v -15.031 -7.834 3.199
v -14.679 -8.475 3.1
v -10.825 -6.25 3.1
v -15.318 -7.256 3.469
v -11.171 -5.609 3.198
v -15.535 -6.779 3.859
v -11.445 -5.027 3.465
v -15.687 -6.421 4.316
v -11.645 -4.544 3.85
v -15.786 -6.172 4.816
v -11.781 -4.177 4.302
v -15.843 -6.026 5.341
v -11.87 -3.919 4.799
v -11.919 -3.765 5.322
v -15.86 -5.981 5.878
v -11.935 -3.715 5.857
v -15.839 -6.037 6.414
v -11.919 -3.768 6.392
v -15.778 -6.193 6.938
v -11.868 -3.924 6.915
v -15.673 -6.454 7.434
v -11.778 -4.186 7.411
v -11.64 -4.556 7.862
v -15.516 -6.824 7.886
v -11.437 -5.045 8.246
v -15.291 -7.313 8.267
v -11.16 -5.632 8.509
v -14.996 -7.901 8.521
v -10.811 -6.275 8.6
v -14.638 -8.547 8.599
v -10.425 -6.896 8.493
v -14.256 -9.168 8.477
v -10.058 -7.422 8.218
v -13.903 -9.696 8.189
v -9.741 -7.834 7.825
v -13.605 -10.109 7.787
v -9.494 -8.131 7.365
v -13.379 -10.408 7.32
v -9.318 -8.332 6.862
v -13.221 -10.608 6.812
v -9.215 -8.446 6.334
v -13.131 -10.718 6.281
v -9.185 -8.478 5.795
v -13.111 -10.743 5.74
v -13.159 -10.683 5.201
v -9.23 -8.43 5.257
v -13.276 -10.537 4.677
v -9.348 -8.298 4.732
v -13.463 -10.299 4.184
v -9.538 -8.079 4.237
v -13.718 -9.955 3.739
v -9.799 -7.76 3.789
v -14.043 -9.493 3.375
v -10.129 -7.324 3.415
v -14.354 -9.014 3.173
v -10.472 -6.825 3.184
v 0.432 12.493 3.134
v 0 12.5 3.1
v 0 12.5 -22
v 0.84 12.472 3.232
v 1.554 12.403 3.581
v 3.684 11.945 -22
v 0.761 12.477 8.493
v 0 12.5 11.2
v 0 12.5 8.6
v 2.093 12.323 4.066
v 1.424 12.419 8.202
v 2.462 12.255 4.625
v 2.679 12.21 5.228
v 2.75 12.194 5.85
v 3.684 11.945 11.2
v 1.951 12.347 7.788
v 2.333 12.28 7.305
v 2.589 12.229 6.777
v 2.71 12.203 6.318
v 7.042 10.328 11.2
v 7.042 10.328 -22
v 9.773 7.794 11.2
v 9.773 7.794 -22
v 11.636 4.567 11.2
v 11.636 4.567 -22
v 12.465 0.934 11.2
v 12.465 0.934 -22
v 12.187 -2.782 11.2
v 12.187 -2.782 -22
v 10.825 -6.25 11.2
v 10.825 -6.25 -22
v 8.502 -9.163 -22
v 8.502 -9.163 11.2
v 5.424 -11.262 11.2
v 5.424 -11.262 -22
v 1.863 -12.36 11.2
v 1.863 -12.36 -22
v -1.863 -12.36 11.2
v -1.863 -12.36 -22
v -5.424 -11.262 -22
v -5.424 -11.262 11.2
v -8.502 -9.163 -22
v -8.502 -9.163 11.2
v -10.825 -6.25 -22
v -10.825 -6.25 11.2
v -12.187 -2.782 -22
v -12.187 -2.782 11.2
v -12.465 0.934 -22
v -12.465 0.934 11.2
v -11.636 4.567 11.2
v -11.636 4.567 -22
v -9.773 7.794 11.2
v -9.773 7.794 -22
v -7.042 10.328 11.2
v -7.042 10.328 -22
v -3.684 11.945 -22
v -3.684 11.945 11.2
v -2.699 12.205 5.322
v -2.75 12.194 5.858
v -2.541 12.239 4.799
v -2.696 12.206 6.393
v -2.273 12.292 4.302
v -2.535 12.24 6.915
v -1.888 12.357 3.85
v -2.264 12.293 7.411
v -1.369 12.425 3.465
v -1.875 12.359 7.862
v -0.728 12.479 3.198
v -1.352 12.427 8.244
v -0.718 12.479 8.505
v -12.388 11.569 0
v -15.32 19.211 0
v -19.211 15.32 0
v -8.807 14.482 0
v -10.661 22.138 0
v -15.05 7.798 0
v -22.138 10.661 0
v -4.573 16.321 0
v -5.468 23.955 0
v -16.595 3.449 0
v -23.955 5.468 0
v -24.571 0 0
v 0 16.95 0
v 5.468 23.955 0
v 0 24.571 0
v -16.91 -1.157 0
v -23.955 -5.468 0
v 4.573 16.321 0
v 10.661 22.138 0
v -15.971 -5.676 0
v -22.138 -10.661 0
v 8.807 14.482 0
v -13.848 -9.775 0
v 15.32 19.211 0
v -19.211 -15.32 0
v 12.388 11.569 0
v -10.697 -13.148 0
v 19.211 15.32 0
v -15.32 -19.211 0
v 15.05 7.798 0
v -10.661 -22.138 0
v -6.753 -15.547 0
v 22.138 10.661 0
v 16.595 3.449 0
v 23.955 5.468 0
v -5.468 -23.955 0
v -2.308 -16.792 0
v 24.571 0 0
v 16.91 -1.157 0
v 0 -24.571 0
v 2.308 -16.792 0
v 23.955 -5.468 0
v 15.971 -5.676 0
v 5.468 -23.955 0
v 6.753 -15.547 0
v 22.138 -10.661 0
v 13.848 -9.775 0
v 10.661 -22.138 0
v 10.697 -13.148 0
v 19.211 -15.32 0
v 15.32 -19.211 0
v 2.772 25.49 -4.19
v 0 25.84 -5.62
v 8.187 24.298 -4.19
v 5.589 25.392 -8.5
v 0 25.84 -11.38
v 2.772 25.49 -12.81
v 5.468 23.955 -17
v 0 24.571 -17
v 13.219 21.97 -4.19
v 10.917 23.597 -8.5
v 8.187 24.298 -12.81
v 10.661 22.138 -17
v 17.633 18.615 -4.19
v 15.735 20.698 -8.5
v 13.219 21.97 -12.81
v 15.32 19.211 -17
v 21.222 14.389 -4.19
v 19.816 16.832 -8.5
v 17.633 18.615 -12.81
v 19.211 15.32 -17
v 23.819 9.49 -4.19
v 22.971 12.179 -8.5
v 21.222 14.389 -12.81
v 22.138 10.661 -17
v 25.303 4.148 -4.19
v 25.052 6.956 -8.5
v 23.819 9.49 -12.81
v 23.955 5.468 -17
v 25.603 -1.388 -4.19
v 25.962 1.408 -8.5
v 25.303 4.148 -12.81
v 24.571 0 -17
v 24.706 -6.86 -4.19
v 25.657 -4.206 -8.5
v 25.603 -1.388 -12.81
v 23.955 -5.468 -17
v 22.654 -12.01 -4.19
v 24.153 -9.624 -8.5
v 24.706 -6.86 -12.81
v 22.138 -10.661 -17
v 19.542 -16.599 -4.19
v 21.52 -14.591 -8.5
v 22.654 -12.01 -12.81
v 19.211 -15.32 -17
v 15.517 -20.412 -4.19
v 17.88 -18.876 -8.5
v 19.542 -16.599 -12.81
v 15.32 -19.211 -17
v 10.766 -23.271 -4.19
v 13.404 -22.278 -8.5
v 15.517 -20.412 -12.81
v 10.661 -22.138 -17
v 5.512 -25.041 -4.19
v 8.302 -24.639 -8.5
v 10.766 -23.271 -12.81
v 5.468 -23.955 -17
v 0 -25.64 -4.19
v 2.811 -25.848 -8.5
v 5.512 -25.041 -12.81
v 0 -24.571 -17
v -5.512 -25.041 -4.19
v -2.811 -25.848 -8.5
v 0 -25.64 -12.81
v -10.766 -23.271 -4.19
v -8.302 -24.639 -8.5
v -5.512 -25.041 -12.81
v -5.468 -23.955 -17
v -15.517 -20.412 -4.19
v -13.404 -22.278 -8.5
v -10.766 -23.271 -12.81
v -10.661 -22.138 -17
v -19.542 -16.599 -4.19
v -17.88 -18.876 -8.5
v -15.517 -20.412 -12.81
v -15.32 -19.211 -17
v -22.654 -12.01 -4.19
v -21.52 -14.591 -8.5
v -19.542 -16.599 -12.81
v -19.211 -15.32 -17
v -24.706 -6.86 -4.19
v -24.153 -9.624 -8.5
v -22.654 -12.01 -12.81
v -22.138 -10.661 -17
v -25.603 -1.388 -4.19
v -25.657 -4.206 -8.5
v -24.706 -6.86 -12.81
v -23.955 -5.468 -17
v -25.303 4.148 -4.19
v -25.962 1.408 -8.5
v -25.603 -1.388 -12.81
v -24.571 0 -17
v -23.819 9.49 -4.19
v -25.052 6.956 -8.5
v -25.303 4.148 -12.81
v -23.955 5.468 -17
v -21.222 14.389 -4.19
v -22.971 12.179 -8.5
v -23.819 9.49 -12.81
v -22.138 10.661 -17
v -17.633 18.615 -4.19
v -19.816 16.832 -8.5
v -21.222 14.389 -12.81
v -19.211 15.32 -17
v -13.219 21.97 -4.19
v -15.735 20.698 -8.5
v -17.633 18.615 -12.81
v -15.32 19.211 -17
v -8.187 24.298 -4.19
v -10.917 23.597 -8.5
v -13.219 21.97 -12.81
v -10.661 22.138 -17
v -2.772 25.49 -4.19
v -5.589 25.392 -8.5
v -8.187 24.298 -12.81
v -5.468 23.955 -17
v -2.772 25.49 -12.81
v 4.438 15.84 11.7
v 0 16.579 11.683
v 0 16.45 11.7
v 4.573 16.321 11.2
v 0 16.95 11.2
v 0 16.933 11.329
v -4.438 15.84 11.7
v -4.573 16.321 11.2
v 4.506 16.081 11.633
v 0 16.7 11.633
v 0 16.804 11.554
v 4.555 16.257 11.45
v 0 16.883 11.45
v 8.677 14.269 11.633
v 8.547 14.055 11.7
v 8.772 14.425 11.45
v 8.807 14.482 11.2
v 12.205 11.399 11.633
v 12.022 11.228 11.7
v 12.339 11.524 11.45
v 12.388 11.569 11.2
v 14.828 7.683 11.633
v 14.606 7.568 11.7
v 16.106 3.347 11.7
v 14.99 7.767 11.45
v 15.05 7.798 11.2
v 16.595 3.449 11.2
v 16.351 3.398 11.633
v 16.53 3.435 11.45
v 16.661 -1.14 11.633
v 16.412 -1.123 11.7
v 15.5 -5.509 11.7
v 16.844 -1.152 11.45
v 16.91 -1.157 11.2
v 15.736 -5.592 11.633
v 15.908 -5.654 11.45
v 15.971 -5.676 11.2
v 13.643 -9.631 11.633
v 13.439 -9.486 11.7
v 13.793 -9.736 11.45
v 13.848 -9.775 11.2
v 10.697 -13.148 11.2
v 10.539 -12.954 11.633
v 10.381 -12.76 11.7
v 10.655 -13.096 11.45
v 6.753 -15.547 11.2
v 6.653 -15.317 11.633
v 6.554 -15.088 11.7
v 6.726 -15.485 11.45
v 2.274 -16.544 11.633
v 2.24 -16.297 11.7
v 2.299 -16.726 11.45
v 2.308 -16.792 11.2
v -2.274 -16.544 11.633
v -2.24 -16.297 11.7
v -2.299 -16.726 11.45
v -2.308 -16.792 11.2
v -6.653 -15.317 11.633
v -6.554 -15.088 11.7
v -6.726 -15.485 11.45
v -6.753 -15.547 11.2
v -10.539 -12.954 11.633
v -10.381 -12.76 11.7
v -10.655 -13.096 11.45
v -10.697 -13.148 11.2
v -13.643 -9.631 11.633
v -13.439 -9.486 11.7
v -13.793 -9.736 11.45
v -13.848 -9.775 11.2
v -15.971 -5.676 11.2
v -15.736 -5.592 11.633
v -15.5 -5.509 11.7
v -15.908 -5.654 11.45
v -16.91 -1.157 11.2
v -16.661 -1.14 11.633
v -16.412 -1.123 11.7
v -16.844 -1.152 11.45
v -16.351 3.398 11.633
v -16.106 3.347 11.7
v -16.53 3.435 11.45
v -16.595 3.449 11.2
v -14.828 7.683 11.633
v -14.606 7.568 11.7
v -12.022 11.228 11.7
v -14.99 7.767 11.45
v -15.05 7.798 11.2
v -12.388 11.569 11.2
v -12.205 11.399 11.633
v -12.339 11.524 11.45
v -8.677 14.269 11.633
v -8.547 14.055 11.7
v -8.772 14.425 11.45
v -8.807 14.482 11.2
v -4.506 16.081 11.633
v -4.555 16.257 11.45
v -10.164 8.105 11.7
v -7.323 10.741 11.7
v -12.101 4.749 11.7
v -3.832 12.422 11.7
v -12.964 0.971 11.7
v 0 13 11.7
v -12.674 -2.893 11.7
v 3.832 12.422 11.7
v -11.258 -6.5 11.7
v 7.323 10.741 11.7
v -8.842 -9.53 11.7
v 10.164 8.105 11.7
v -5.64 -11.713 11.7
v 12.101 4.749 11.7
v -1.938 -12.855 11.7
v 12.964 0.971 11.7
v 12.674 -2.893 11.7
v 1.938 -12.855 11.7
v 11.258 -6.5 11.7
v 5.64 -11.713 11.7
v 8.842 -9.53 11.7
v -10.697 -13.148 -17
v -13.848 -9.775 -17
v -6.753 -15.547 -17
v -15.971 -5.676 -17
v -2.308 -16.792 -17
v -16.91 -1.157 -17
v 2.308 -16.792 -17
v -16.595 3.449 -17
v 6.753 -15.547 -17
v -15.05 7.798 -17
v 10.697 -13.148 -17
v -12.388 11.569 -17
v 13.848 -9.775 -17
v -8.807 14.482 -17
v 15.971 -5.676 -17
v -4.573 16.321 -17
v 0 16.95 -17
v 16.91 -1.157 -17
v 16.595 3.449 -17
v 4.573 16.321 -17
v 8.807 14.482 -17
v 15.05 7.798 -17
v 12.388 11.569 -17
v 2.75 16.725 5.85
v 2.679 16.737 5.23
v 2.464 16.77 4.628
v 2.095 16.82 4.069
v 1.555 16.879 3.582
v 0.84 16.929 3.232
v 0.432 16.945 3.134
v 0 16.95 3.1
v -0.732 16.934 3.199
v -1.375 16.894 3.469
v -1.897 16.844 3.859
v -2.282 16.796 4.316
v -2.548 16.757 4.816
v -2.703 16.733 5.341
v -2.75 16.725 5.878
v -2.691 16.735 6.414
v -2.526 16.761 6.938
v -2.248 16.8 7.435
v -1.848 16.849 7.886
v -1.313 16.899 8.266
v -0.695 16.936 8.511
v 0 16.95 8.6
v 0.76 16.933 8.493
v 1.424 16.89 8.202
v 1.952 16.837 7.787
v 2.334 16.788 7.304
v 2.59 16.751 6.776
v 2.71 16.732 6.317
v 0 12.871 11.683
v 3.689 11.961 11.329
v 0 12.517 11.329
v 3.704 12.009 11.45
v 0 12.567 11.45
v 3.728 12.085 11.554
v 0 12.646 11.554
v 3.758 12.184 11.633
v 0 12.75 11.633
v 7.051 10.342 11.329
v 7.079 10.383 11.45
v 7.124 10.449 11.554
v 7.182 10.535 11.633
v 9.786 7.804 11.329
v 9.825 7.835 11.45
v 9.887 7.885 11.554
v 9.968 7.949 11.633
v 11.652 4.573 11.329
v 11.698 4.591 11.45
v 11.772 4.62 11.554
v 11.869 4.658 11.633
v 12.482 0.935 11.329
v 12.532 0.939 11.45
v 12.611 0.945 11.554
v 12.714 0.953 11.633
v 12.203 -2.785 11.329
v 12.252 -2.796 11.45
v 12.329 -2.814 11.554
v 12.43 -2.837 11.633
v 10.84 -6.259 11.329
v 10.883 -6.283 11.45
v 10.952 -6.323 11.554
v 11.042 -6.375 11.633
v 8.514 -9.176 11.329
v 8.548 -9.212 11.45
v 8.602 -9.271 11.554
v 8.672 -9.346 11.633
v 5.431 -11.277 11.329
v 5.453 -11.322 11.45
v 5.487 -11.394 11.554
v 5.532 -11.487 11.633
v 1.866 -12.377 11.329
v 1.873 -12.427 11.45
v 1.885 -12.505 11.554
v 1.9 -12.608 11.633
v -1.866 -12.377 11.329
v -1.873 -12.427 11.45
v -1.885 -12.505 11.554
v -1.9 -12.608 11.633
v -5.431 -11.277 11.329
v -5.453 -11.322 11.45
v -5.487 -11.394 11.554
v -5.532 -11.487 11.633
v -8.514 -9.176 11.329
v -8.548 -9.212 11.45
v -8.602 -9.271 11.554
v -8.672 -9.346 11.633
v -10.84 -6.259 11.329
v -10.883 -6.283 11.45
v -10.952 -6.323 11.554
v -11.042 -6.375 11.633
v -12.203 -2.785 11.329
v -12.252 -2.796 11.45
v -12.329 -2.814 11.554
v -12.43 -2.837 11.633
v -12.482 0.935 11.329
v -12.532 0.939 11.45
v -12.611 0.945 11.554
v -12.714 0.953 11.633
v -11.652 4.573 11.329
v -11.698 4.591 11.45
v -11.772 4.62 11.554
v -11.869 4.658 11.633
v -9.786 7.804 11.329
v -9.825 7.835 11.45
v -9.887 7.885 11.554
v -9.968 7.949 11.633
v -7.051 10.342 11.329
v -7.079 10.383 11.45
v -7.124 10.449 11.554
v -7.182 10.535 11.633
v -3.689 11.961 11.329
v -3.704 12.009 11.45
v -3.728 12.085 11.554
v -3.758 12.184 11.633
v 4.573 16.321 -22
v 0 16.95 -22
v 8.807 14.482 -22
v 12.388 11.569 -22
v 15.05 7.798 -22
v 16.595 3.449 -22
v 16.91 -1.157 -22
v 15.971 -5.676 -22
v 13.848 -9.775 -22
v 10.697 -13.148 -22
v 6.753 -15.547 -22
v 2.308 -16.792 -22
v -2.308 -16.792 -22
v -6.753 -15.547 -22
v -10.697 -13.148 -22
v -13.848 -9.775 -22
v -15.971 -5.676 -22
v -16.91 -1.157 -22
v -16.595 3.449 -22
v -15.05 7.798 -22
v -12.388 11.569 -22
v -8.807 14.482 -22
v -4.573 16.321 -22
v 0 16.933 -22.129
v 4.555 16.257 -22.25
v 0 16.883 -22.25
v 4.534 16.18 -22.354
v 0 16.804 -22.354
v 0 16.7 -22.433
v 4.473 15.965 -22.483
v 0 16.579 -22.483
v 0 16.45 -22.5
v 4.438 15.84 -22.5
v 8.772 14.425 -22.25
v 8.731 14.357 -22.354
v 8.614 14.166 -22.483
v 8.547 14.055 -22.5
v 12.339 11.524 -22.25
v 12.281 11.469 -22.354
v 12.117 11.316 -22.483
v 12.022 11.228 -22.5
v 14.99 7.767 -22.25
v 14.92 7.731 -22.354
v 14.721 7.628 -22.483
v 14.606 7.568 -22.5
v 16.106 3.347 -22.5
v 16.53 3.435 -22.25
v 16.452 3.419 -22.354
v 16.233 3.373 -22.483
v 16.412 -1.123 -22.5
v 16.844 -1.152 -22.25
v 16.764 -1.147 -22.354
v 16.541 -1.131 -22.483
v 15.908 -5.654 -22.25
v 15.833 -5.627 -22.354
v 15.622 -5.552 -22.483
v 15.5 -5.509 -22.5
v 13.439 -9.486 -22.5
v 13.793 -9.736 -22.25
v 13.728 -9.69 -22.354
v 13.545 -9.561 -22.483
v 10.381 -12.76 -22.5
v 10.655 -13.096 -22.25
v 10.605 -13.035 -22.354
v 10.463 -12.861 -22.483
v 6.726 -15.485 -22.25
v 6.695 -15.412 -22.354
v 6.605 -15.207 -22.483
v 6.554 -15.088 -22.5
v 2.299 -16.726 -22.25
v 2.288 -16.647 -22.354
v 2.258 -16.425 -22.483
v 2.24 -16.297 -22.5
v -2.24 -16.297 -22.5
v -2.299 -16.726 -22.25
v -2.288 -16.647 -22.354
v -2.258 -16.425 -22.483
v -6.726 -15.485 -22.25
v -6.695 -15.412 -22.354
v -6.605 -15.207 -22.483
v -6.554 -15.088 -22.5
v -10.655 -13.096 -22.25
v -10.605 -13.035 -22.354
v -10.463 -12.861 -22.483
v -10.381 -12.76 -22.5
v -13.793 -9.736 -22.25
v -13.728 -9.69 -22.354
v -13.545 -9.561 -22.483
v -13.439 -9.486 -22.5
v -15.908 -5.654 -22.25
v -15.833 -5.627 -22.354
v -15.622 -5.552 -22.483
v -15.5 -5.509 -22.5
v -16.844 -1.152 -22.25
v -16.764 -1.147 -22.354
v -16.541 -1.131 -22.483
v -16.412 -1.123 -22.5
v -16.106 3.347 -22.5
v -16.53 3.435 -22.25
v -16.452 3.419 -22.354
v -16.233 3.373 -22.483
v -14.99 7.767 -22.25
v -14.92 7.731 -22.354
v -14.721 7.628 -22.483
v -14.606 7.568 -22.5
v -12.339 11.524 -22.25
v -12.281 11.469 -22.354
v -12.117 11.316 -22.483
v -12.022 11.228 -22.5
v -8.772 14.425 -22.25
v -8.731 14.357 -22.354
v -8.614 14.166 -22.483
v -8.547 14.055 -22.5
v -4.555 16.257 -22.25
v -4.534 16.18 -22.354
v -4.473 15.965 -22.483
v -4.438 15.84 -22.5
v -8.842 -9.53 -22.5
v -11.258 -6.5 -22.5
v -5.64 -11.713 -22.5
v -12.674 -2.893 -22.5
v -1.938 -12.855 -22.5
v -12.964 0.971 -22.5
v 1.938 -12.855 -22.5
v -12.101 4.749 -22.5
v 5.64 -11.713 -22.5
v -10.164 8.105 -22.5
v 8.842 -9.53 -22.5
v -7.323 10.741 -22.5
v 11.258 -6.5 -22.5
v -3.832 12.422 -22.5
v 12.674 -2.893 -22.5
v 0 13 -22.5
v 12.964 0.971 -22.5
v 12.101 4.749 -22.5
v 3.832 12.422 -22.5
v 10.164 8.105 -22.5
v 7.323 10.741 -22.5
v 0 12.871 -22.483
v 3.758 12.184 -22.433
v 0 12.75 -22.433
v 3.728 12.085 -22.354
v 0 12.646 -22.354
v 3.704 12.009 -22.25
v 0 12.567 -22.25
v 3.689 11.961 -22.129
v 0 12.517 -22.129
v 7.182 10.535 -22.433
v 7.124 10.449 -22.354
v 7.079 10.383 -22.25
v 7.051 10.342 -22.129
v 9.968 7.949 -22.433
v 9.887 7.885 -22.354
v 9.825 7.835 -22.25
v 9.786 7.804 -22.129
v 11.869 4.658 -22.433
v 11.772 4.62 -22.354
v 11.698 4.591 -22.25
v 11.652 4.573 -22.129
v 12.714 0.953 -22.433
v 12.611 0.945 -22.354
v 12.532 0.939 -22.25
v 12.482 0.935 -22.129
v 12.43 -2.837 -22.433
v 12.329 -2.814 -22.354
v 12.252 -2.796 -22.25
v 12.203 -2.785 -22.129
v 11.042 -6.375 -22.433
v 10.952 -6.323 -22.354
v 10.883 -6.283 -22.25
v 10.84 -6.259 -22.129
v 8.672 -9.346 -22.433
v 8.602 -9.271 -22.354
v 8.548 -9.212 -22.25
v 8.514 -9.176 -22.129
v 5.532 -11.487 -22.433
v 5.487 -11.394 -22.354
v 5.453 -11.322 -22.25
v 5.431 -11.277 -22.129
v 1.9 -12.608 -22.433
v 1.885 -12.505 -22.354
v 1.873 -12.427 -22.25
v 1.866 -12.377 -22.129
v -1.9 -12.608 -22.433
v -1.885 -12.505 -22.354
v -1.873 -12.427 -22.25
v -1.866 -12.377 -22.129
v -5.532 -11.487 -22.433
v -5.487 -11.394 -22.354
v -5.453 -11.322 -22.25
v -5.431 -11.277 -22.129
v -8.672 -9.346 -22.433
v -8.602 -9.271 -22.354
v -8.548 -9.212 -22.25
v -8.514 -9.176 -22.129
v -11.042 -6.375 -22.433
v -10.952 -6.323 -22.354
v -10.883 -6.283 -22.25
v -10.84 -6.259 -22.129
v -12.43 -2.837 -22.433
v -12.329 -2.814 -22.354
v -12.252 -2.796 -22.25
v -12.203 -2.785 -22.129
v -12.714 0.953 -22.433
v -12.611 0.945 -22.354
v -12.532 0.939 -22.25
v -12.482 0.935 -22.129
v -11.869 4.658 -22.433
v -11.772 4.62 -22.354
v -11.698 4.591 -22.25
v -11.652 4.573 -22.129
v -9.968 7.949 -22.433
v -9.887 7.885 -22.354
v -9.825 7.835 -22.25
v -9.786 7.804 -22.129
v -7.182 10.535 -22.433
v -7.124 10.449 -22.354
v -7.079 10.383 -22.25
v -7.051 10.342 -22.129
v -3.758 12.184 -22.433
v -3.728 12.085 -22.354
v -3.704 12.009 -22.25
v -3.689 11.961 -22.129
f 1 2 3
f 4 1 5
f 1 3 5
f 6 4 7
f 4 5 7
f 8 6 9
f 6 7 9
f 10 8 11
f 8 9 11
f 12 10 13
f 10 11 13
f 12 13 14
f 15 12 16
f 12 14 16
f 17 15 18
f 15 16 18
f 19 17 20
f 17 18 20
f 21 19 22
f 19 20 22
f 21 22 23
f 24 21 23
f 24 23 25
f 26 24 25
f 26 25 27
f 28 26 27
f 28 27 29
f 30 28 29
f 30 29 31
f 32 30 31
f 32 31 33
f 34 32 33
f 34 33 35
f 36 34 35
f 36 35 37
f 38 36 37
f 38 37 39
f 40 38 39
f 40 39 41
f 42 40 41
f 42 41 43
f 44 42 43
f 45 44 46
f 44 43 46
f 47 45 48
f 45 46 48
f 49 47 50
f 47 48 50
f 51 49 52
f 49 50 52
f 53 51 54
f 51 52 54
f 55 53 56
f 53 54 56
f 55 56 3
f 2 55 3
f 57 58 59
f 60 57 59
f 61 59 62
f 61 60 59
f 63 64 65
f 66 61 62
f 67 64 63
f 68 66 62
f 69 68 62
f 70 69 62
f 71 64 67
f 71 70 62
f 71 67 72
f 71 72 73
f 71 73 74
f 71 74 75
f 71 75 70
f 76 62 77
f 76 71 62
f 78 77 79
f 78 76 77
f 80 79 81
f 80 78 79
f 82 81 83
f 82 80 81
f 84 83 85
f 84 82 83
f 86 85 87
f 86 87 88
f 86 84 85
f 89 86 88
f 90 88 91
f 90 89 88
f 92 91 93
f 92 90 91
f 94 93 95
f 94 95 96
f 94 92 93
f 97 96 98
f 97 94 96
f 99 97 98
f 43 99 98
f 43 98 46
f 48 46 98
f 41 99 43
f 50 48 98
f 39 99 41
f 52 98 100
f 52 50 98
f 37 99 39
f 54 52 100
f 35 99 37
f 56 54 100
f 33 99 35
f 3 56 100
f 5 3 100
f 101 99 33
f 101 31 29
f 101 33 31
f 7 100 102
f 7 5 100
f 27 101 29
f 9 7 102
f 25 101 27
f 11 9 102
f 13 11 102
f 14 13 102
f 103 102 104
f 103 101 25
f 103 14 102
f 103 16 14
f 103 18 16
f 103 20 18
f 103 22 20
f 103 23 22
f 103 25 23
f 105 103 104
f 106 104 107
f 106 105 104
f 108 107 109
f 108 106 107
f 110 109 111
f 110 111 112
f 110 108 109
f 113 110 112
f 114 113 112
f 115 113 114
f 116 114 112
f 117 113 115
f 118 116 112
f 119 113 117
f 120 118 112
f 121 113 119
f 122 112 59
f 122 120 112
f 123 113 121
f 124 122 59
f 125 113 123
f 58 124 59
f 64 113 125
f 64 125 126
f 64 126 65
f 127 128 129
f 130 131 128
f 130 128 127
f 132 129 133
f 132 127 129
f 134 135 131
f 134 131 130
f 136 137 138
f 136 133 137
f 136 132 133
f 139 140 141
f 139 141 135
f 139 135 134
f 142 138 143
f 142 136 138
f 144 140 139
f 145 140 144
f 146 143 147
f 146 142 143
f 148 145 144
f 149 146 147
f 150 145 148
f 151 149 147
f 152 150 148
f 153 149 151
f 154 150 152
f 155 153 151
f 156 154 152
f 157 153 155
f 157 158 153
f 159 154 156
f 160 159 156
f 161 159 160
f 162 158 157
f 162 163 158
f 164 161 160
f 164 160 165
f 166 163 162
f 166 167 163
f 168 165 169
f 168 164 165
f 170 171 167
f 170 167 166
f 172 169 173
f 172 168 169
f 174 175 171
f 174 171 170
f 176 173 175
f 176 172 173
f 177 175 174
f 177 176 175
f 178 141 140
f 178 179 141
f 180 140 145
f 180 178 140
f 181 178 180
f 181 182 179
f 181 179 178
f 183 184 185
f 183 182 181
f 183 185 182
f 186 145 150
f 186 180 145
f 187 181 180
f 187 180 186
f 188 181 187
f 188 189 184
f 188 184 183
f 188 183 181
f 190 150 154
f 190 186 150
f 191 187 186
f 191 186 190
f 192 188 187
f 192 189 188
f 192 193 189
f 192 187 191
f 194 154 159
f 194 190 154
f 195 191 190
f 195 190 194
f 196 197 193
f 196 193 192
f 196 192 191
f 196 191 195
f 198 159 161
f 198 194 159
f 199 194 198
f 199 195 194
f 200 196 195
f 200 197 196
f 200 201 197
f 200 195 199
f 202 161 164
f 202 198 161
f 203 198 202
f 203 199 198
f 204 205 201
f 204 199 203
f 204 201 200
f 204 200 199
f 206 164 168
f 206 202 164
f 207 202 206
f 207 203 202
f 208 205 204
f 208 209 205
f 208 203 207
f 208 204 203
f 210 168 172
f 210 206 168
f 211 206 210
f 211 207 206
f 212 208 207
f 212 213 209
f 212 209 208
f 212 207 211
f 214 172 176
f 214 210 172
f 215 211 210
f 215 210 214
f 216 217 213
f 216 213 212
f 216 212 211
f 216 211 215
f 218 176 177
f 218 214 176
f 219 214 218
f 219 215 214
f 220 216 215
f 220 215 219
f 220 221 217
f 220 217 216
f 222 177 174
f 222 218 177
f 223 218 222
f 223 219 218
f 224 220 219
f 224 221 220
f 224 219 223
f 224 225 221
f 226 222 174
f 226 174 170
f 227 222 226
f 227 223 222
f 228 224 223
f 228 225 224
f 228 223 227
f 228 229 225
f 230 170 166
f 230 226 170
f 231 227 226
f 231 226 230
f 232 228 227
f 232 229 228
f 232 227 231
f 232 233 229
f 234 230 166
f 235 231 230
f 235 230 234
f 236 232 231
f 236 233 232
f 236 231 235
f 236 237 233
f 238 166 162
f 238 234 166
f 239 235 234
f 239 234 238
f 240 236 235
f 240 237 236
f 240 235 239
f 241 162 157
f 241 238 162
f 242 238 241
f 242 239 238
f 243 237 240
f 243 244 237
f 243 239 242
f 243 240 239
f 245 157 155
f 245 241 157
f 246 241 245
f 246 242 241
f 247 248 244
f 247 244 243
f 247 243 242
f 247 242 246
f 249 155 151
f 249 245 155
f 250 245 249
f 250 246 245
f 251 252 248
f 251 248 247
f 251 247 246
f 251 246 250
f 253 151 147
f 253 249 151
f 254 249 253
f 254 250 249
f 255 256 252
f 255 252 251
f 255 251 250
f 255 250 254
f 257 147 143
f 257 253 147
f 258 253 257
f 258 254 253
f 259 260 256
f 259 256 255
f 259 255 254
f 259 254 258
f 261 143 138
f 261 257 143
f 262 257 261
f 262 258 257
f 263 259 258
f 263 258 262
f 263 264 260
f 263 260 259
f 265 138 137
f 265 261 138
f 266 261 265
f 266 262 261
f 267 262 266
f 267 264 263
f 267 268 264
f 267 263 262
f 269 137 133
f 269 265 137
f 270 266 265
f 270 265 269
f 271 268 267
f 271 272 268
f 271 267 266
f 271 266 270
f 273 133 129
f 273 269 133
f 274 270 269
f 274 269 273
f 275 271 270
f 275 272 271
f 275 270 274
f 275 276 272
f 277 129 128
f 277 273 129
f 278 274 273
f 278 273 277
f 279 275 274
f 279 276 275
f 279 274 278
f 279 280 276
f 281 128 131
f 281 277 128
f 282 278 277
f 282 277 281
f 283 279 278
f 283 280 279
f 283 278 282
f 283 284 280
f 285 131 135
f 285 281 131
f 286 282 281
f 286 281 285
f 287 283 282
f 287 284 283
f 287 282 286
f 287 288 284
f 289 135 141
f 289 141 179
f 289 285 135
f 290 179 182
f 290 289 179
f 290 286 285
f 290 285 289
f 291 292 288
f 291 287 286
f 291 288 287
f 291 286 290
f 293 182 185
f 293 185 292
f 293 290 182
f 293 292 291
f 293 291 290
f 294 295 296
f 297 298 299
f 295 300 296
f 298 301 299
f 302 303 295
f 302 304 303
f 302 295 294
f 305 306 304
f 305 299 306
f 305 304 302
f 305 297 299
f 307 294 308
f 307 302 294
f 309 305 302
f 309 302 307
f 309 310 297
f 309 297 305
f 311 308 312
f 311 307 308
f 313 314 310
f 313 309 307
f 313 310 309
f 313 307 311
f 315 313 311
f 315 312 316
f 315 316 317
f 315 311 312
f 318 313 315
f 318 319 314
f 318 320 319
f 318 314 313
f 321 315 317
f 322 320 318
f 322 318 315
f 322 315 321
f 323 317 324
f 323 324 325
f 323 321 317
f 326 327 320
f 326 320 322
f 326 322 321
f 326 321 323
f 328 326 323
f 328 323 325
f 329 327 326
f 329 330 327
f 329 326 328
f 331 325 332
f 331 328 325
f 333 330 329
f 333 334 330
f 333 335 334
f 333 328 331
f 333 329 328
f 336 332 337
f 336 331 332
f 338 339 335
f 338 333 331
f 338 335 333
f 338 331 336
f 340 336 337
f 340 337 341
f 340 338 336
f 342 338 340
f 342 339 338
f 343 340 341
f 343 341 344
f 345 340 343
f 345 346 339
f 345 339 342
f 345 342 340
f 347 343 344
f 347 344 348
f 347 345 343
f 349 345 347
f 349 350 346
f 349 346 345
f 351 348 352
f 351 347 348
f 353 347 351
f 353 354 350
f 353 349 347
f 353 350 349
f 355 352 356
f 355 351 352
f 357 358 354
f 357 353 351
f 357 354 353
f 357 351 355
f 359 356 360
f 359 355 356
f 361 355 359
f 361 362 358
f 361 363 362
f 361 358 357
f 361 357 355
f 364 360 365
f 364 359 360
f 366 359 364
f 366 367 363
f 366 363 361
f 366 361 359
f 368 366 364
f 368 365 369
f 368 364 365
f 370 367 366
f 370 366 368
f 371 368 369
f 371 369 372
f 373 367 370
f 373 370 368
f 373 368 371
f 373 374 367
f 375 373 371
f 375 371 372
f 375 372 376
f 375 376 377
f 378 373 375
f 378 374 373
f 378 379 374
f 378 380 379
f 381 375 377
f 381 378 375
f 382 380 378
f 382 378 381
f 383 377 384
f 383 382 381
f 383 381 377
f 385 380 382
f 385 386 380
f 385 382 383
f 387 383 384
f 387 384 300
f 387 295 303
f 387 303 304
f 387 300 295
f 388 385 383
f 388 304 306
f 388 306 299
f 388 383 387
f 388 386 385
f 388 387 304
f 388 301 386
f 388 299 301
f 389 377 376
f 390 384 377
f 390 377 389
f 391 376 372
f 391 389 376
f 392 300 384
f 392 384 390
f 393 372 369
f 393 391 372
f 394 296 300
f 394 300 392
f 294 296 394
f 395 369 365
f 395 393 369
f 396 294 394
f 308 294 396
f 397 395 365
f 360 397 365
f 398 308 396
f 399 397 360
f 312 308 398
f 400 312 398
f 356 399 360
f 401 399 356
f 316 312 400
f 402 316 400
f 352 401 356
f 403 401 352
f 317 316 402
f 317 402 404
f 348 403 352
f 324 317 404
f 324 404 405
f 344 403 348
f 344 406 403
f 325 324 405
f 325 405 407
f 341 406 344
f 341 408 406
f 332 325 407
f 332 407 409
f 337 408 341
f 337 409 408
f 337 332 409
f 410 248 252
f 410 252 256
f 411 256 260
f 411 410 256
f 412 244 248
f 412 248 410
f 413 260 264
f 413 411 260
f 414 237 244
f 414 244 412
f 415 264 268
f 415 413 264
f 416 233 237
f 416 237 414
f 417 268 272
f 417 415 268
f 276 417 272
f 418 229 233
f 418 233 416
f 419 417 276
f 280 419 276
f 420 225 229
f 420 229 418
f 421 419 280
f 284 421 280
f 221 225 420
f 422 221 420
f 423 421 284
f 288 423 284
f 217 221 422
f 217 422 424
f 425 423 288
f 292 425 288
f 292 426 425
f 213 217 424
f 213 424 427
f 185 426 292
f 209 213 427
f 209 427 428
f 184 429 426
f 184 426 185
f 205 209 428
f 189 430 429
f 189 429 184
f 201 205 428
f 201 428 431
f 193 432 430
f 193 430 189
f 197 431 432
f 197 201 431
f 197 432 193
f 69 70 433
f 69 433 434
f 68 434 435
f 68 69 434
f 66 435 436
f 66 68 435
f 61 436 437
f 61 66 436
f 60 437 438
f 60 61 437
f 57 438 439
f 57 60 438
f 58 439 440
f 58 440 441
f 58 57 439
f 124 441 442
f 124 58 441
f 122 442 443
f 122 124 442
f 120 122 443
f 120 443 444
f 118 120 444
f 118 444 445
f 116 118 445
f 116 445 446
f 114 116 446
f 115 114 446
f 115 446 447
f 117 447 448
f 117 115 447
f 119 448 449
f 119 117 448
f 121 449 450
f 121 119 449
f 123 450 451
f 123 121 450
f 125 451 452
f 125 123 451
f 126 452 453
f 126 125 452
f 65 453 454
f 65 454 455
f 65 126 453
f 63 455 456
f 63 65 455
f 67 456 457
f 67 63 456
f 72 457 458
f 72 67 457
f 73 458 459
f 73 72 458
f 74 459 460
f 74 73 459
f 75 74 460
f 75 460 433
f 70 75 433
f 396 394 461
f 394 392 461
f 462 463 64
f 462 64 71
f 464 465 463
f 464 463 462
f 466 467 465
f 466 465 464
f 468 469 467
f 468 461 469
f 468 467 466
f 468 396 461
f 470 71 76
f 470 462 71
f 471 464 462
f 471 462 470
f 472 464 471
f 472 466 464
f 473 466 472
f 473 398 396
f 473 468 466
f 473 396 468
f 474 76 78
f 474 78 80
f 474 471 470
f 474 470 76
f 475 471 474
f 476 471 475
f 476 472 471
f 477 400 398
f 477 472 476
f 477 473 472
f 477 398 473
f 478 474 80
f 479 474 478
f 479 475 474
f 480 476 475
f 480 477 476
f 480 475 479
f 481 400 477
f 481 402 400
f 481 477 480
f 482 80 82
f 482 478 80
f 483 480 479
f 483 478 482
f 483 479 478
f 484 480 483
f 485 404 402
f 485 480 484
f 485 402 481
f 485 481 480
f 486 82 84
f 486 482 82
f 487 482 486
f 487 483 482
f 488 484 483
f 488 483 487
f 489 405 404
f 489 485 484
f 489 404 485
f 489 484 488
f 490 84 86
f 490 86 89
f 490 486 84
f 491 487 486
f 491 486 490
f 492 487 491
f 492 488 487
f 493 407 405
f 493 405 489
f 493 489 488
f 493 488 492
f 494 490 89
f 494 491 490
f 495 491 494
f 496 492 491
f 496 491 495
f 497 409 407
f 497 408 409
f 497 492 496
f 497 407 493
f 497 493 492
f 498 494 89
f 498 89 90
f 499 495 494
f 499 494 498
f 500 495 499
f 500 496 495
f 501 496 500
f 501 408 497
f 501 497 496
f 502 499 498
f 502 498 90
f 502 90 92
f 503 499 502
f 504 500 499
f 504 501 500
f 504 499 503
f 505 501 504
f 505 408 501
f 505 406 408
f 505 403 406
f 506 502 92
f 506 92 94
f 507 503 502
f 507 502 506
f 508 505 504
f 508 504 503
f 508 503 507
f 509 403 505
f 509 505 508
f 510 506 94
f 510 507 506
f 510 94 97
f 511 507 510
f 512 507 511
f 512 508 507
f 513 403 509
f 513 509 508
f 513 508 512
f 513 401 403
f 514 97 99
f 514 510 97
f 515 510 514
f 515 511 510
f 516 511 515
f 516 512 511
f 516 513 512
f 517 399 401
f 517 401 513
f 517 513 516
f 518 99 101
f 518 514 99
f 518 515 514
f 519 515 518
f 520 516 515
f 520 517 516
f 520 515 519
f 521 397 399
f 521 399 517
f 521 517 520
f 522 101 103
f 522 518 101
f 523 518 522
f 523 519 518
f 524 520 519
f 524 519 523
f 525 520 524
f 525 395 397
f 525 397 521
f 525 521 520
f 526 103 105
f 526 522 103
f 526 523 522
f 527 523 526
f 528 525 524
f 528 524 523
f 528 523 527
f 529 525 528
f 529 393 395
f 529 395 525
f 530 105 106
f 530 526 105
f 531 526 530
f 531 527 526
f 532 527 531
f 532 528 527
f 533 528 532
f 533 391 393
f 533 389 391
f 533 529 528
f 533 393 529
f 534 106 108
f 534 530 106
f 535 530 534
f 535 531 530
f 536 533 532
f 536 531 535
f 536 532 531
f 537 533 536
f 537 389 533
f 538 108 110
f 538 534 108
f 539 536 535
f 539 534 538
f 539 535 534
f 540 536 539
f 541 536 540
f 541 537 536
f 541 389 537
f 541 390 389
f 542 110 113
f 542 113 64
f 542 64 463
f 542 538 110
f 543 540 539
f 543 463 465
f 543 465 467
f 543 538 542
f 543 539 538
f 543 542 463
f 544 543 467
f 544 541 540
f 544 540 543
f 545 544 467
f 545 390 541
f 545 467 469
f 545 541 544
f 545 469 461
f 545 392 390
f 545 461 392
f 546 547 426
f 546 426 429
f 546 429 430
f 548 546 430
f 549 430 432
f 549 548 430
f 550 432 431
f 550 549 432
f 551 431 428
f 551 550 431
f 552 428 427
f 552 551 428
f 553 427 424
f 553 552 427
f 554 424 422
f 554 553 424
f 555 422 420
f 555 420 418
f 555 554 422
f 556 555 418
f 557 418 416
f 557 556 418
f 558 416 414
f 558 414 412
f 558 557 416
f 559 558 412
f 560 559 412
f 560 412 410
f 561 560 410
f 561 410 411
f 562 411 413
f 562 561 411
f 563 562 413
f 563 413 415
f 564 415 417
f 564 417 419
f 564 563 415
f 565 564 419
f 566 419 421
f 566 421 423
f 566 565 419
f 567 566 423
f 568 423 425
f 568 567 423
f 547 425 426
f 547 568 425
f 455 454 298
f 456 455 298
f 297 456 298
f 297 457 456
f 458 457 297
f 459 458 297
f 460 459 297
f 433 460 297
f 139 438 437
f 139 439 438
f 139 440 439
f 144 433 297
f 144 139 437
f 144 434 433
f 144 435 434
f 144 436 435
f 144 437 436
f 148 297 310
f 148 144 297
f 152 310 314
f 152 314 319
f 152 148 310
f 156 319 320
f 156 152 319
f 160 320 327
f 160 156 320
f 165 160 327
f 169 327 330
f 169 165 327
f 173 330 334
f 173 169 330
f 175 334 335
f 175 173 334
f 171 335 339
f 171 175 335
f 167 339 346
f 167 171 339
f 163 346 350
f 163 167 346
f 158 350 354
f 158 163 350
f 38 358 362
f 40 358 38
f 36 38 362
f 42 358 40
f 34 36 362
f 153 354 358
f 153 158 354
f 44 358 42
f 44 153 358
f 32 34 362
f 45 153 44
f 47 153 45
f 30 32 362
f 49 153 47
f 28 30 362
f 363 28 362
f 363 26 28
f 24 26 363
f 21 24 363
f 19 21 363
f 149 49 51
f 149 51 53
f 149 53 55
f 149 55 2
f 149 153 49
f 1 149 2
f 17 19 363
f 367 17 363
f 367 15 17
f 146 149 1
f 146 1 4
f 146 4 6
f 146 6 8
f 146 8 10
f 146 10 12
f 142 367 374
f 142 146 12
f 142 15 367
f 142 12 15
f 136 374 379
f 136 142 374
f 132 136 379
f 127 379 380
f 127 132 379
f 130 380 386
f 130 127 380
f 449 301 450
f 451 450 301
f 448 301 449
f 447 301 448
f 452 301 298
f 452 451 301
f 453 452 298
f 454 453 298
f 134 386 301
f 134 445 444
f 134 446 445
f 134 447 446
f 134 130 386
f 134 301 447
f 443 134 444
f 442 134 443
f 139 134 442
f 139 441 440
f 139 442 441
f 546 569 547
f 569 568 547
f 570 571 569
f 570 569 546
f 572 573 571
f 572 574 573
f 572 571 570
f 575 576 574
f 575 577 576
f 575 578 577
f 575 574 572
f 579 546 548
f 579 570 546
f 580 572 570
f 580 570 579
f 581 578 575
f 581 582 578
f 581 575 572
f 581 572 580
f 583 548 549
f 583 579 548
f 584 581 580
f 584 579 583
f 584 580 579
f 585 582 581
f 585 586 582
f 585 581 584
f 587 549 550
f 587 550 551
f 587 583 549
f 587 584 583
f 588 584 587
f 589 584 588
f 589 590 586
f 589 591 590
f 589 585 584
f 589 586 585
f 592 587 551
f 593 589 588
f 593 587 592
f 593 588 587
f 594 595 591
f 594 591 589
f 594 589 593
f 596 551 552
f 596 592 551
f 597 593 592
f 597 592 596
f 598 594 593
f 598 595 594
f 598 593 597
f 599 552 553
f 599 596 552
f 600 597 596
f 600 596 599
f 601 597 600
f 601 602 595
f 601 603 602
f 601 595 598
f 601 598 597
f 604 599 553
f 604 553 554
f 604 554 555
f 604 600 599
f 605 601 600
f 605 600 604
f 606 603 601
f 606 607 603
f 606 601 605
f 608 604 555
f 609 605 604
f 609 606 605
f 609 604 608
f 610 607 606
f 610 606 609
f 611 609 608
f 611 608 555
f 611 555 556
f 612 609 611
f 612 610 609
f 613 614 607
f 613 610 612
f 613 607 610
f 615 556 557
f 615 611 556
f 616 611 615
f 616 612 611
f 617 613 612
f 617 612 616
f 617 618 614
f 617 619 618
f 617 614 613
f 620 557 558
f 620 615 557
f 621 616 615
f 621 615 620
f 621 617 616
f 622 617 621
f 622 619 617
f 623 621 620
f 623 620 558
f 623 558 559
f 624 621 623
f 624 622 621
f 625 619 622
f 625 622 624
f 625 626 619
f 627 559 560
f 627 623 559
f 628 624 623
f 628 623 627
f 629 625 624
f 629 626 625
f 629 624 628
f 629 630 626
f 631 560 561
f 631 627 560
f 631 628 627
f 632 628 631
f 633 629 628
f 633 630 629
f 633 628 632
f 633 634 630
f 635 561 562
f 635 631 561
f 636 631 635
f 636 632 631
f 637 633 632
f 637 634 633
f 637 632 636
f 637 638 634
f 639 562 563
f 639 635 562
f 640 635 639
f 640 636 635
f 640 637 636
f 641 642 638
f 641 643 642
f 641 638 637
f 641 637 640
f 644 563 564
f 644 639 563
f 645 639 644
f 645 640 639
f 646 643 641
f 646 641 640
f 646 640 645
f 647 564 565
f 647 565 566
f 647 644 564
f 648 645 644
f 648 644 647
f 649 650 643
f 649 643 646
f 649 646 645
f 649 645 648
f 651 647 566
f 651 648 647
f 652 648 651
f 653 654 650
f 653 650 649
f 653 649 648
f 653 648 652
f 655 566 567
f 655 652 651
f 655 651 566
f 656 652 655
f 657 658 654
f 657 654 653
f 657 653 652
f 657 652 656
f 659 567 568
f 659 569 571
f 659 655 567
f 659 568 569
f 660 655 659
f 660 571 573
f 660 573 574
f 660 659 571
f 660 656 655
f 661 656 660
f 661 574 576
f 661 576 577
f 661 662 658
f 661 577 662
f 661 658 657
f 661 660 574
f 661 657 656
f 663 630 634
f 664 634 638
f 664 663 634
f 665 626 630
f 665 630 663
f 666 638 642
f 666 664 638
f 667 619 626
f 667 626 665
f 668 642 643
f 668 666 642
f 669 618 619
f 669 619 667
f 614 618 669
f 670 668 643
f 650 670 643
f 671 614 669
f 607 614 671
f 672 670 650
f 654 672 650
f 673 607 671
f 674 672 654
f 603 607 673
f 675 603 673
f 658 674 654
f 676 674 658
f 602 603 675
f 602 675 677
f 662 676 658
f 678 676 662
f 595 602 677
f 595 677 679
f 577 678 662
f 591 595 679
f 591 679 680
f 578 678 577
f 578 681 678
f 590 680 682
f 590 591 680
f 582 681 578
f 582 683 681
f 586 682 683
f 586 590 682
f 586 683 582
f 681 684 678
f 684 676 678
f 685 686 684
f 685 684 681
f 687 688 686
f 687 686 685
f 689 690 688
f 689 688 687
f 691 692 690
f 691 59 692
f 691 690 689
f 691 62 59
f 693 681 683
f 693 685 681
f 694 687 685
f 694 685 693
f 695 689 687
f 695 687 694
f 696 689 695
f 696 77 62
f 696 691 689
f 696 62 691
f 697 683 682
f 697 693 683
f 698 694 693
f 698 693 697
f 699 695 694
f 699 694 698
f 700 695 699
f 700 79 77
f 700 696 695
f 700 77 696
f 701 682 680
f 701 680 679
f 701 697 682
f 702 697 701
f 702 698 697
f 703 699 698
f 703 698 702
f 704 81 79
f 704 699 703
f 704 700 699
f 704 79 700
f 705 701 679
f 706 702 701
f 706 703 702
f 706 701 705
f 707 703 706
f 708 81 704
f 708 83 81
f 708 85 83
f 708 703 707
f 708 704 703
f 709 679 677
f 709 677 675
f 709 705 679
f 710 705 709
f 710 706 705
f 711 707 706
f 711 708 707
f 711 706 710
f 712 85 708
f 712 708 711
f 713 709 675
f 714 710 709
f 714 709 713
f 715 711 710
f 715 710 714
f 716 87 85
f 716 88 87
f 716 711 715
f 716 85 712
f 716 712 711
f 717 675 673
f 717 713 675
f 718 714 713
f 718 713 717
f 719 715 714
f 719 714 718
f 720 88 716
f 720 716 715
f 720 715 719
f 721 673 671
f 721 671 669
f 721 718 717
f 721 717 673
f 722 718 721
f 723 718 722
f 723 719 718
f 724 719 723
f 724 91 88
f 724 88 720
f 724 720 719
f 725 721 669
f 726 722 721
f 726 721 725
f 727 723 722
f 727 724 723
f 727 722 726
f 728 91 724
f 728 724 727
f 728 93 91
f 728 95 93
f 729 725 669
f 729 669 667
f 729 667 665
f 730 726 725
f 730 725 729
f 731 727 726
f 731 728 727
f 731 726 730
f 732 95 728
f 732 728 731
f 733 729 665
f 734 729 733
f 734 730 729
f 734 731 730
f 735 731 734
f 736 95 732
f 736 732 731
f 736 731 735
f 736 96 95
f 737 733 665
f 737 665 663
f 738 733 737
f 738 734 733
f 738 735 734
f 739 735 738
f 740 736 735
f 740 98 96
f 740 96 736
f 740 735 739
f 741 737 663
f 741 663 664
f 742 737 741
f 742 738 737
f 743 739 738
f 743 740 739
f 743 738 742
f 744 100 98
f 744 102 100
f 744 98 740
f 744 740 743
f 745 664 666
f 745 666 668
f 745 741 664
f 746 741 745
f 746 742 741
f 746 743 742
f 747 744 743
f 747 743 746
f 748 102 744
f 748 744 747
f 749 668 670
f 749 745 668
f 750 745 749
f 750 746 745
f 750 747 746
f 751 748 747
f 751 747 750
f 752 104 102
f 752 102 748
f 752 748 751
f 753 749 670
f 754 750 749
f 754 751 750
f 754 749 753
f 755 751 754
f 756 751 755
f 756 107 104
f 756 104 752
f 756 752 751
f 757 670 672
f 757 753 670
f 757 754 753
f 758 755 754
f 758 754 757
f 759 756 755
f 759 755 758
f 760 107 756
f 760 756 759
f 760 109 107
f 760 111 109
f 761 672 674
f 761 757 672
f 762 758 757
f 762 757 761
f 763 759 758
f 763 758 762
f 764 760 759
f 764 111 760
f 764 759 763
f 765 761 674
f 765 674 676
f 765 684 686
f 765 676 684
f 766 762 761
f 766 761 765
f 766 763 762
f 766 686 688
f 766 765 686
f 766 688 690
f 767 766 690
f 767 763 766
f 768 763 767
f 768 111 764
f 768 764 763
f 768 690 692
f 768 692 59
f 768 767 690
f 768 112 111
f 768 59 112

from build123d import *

# Parameters (mm, degrees)
SKETCH_2_R          = 2.75
CUT_EXTRUDE_1_DEPTH = 44.107423955
SKETCH_3_R          = 2.75
CUT_EXTRUDE_2_DEPTH = 44.107424007
FILLET_1_R          = 0.5


with BuildPart() as part:
    # Эскиз1 → Повернуть1 (revolve)
    with BuildSketch(Plane(origin=(0, 0, 0), x_dir=(0, 0, -1), z_dir=(1, 0, 0))):
        with BuildLine():
            Line((17, 16.95), (22.5, 16.95))
            Line((22.5, 16.95), (22.5, 12.5))
            Line((22.5, 12.5), (-11.7, 12.5))
            Line((-11.7, 12.5), (-11.7, 16.95))
            Line((-11.7, 16.95), (0, 16.95))
            Line((0, 16.95), (0, 24.571324751))
            ThreePointArc((0, 24.571324751), (8.5, 26), (17, 24.571324751))
            Line((17, 24.571324751), (17, 16.95))
        make_face()
    revolve(axis=Axis((0, 0, 1108.809062344), (0, 0, -1)))

    # Эскиз2 → Вырез-Вытянуть1 (cut, through all)
    with BuildSketch(Plane(origin=(0, 0, 0), x_dir=(1, 0, 0), z_dir=(0, 1, 0))):
        with Locations((0, -5.85)):
            Circle(SKETCH_2_R)
    extrude(amount=CUT_EXTRUDE_1_DEPTH, mode=Mode.SUBTRACT)

    # Эскиз3 → Вырез-Вытянуть2 (cut, through all)
    with BuildSketch(Plane(origin=(0, 0, 0), x_dir=(0, 0, -1), z_dir=(0.8660254037844398, 0.499999999999998, 0))):
        with Locations((-5.85, 0)):
            Circle(SKETCH_3_R)
    extrude(amount=-CUT_EXTRUDE_2_DEPTH, mode=Mode.SUBTRACT)

    # Скругление1
    fillet_1_edges = [part.edges().sort_by_distance(p)[0] for p in [
        (0, -12.5, -22.5),
        (0, -16.95, -22.5),
        (0, -12.5, 11.7),
        (0, -16.95, 11.7),
    ]]
    fillet(fillet_1_edges, radius=FILLET_1_R)


solid = part.part
